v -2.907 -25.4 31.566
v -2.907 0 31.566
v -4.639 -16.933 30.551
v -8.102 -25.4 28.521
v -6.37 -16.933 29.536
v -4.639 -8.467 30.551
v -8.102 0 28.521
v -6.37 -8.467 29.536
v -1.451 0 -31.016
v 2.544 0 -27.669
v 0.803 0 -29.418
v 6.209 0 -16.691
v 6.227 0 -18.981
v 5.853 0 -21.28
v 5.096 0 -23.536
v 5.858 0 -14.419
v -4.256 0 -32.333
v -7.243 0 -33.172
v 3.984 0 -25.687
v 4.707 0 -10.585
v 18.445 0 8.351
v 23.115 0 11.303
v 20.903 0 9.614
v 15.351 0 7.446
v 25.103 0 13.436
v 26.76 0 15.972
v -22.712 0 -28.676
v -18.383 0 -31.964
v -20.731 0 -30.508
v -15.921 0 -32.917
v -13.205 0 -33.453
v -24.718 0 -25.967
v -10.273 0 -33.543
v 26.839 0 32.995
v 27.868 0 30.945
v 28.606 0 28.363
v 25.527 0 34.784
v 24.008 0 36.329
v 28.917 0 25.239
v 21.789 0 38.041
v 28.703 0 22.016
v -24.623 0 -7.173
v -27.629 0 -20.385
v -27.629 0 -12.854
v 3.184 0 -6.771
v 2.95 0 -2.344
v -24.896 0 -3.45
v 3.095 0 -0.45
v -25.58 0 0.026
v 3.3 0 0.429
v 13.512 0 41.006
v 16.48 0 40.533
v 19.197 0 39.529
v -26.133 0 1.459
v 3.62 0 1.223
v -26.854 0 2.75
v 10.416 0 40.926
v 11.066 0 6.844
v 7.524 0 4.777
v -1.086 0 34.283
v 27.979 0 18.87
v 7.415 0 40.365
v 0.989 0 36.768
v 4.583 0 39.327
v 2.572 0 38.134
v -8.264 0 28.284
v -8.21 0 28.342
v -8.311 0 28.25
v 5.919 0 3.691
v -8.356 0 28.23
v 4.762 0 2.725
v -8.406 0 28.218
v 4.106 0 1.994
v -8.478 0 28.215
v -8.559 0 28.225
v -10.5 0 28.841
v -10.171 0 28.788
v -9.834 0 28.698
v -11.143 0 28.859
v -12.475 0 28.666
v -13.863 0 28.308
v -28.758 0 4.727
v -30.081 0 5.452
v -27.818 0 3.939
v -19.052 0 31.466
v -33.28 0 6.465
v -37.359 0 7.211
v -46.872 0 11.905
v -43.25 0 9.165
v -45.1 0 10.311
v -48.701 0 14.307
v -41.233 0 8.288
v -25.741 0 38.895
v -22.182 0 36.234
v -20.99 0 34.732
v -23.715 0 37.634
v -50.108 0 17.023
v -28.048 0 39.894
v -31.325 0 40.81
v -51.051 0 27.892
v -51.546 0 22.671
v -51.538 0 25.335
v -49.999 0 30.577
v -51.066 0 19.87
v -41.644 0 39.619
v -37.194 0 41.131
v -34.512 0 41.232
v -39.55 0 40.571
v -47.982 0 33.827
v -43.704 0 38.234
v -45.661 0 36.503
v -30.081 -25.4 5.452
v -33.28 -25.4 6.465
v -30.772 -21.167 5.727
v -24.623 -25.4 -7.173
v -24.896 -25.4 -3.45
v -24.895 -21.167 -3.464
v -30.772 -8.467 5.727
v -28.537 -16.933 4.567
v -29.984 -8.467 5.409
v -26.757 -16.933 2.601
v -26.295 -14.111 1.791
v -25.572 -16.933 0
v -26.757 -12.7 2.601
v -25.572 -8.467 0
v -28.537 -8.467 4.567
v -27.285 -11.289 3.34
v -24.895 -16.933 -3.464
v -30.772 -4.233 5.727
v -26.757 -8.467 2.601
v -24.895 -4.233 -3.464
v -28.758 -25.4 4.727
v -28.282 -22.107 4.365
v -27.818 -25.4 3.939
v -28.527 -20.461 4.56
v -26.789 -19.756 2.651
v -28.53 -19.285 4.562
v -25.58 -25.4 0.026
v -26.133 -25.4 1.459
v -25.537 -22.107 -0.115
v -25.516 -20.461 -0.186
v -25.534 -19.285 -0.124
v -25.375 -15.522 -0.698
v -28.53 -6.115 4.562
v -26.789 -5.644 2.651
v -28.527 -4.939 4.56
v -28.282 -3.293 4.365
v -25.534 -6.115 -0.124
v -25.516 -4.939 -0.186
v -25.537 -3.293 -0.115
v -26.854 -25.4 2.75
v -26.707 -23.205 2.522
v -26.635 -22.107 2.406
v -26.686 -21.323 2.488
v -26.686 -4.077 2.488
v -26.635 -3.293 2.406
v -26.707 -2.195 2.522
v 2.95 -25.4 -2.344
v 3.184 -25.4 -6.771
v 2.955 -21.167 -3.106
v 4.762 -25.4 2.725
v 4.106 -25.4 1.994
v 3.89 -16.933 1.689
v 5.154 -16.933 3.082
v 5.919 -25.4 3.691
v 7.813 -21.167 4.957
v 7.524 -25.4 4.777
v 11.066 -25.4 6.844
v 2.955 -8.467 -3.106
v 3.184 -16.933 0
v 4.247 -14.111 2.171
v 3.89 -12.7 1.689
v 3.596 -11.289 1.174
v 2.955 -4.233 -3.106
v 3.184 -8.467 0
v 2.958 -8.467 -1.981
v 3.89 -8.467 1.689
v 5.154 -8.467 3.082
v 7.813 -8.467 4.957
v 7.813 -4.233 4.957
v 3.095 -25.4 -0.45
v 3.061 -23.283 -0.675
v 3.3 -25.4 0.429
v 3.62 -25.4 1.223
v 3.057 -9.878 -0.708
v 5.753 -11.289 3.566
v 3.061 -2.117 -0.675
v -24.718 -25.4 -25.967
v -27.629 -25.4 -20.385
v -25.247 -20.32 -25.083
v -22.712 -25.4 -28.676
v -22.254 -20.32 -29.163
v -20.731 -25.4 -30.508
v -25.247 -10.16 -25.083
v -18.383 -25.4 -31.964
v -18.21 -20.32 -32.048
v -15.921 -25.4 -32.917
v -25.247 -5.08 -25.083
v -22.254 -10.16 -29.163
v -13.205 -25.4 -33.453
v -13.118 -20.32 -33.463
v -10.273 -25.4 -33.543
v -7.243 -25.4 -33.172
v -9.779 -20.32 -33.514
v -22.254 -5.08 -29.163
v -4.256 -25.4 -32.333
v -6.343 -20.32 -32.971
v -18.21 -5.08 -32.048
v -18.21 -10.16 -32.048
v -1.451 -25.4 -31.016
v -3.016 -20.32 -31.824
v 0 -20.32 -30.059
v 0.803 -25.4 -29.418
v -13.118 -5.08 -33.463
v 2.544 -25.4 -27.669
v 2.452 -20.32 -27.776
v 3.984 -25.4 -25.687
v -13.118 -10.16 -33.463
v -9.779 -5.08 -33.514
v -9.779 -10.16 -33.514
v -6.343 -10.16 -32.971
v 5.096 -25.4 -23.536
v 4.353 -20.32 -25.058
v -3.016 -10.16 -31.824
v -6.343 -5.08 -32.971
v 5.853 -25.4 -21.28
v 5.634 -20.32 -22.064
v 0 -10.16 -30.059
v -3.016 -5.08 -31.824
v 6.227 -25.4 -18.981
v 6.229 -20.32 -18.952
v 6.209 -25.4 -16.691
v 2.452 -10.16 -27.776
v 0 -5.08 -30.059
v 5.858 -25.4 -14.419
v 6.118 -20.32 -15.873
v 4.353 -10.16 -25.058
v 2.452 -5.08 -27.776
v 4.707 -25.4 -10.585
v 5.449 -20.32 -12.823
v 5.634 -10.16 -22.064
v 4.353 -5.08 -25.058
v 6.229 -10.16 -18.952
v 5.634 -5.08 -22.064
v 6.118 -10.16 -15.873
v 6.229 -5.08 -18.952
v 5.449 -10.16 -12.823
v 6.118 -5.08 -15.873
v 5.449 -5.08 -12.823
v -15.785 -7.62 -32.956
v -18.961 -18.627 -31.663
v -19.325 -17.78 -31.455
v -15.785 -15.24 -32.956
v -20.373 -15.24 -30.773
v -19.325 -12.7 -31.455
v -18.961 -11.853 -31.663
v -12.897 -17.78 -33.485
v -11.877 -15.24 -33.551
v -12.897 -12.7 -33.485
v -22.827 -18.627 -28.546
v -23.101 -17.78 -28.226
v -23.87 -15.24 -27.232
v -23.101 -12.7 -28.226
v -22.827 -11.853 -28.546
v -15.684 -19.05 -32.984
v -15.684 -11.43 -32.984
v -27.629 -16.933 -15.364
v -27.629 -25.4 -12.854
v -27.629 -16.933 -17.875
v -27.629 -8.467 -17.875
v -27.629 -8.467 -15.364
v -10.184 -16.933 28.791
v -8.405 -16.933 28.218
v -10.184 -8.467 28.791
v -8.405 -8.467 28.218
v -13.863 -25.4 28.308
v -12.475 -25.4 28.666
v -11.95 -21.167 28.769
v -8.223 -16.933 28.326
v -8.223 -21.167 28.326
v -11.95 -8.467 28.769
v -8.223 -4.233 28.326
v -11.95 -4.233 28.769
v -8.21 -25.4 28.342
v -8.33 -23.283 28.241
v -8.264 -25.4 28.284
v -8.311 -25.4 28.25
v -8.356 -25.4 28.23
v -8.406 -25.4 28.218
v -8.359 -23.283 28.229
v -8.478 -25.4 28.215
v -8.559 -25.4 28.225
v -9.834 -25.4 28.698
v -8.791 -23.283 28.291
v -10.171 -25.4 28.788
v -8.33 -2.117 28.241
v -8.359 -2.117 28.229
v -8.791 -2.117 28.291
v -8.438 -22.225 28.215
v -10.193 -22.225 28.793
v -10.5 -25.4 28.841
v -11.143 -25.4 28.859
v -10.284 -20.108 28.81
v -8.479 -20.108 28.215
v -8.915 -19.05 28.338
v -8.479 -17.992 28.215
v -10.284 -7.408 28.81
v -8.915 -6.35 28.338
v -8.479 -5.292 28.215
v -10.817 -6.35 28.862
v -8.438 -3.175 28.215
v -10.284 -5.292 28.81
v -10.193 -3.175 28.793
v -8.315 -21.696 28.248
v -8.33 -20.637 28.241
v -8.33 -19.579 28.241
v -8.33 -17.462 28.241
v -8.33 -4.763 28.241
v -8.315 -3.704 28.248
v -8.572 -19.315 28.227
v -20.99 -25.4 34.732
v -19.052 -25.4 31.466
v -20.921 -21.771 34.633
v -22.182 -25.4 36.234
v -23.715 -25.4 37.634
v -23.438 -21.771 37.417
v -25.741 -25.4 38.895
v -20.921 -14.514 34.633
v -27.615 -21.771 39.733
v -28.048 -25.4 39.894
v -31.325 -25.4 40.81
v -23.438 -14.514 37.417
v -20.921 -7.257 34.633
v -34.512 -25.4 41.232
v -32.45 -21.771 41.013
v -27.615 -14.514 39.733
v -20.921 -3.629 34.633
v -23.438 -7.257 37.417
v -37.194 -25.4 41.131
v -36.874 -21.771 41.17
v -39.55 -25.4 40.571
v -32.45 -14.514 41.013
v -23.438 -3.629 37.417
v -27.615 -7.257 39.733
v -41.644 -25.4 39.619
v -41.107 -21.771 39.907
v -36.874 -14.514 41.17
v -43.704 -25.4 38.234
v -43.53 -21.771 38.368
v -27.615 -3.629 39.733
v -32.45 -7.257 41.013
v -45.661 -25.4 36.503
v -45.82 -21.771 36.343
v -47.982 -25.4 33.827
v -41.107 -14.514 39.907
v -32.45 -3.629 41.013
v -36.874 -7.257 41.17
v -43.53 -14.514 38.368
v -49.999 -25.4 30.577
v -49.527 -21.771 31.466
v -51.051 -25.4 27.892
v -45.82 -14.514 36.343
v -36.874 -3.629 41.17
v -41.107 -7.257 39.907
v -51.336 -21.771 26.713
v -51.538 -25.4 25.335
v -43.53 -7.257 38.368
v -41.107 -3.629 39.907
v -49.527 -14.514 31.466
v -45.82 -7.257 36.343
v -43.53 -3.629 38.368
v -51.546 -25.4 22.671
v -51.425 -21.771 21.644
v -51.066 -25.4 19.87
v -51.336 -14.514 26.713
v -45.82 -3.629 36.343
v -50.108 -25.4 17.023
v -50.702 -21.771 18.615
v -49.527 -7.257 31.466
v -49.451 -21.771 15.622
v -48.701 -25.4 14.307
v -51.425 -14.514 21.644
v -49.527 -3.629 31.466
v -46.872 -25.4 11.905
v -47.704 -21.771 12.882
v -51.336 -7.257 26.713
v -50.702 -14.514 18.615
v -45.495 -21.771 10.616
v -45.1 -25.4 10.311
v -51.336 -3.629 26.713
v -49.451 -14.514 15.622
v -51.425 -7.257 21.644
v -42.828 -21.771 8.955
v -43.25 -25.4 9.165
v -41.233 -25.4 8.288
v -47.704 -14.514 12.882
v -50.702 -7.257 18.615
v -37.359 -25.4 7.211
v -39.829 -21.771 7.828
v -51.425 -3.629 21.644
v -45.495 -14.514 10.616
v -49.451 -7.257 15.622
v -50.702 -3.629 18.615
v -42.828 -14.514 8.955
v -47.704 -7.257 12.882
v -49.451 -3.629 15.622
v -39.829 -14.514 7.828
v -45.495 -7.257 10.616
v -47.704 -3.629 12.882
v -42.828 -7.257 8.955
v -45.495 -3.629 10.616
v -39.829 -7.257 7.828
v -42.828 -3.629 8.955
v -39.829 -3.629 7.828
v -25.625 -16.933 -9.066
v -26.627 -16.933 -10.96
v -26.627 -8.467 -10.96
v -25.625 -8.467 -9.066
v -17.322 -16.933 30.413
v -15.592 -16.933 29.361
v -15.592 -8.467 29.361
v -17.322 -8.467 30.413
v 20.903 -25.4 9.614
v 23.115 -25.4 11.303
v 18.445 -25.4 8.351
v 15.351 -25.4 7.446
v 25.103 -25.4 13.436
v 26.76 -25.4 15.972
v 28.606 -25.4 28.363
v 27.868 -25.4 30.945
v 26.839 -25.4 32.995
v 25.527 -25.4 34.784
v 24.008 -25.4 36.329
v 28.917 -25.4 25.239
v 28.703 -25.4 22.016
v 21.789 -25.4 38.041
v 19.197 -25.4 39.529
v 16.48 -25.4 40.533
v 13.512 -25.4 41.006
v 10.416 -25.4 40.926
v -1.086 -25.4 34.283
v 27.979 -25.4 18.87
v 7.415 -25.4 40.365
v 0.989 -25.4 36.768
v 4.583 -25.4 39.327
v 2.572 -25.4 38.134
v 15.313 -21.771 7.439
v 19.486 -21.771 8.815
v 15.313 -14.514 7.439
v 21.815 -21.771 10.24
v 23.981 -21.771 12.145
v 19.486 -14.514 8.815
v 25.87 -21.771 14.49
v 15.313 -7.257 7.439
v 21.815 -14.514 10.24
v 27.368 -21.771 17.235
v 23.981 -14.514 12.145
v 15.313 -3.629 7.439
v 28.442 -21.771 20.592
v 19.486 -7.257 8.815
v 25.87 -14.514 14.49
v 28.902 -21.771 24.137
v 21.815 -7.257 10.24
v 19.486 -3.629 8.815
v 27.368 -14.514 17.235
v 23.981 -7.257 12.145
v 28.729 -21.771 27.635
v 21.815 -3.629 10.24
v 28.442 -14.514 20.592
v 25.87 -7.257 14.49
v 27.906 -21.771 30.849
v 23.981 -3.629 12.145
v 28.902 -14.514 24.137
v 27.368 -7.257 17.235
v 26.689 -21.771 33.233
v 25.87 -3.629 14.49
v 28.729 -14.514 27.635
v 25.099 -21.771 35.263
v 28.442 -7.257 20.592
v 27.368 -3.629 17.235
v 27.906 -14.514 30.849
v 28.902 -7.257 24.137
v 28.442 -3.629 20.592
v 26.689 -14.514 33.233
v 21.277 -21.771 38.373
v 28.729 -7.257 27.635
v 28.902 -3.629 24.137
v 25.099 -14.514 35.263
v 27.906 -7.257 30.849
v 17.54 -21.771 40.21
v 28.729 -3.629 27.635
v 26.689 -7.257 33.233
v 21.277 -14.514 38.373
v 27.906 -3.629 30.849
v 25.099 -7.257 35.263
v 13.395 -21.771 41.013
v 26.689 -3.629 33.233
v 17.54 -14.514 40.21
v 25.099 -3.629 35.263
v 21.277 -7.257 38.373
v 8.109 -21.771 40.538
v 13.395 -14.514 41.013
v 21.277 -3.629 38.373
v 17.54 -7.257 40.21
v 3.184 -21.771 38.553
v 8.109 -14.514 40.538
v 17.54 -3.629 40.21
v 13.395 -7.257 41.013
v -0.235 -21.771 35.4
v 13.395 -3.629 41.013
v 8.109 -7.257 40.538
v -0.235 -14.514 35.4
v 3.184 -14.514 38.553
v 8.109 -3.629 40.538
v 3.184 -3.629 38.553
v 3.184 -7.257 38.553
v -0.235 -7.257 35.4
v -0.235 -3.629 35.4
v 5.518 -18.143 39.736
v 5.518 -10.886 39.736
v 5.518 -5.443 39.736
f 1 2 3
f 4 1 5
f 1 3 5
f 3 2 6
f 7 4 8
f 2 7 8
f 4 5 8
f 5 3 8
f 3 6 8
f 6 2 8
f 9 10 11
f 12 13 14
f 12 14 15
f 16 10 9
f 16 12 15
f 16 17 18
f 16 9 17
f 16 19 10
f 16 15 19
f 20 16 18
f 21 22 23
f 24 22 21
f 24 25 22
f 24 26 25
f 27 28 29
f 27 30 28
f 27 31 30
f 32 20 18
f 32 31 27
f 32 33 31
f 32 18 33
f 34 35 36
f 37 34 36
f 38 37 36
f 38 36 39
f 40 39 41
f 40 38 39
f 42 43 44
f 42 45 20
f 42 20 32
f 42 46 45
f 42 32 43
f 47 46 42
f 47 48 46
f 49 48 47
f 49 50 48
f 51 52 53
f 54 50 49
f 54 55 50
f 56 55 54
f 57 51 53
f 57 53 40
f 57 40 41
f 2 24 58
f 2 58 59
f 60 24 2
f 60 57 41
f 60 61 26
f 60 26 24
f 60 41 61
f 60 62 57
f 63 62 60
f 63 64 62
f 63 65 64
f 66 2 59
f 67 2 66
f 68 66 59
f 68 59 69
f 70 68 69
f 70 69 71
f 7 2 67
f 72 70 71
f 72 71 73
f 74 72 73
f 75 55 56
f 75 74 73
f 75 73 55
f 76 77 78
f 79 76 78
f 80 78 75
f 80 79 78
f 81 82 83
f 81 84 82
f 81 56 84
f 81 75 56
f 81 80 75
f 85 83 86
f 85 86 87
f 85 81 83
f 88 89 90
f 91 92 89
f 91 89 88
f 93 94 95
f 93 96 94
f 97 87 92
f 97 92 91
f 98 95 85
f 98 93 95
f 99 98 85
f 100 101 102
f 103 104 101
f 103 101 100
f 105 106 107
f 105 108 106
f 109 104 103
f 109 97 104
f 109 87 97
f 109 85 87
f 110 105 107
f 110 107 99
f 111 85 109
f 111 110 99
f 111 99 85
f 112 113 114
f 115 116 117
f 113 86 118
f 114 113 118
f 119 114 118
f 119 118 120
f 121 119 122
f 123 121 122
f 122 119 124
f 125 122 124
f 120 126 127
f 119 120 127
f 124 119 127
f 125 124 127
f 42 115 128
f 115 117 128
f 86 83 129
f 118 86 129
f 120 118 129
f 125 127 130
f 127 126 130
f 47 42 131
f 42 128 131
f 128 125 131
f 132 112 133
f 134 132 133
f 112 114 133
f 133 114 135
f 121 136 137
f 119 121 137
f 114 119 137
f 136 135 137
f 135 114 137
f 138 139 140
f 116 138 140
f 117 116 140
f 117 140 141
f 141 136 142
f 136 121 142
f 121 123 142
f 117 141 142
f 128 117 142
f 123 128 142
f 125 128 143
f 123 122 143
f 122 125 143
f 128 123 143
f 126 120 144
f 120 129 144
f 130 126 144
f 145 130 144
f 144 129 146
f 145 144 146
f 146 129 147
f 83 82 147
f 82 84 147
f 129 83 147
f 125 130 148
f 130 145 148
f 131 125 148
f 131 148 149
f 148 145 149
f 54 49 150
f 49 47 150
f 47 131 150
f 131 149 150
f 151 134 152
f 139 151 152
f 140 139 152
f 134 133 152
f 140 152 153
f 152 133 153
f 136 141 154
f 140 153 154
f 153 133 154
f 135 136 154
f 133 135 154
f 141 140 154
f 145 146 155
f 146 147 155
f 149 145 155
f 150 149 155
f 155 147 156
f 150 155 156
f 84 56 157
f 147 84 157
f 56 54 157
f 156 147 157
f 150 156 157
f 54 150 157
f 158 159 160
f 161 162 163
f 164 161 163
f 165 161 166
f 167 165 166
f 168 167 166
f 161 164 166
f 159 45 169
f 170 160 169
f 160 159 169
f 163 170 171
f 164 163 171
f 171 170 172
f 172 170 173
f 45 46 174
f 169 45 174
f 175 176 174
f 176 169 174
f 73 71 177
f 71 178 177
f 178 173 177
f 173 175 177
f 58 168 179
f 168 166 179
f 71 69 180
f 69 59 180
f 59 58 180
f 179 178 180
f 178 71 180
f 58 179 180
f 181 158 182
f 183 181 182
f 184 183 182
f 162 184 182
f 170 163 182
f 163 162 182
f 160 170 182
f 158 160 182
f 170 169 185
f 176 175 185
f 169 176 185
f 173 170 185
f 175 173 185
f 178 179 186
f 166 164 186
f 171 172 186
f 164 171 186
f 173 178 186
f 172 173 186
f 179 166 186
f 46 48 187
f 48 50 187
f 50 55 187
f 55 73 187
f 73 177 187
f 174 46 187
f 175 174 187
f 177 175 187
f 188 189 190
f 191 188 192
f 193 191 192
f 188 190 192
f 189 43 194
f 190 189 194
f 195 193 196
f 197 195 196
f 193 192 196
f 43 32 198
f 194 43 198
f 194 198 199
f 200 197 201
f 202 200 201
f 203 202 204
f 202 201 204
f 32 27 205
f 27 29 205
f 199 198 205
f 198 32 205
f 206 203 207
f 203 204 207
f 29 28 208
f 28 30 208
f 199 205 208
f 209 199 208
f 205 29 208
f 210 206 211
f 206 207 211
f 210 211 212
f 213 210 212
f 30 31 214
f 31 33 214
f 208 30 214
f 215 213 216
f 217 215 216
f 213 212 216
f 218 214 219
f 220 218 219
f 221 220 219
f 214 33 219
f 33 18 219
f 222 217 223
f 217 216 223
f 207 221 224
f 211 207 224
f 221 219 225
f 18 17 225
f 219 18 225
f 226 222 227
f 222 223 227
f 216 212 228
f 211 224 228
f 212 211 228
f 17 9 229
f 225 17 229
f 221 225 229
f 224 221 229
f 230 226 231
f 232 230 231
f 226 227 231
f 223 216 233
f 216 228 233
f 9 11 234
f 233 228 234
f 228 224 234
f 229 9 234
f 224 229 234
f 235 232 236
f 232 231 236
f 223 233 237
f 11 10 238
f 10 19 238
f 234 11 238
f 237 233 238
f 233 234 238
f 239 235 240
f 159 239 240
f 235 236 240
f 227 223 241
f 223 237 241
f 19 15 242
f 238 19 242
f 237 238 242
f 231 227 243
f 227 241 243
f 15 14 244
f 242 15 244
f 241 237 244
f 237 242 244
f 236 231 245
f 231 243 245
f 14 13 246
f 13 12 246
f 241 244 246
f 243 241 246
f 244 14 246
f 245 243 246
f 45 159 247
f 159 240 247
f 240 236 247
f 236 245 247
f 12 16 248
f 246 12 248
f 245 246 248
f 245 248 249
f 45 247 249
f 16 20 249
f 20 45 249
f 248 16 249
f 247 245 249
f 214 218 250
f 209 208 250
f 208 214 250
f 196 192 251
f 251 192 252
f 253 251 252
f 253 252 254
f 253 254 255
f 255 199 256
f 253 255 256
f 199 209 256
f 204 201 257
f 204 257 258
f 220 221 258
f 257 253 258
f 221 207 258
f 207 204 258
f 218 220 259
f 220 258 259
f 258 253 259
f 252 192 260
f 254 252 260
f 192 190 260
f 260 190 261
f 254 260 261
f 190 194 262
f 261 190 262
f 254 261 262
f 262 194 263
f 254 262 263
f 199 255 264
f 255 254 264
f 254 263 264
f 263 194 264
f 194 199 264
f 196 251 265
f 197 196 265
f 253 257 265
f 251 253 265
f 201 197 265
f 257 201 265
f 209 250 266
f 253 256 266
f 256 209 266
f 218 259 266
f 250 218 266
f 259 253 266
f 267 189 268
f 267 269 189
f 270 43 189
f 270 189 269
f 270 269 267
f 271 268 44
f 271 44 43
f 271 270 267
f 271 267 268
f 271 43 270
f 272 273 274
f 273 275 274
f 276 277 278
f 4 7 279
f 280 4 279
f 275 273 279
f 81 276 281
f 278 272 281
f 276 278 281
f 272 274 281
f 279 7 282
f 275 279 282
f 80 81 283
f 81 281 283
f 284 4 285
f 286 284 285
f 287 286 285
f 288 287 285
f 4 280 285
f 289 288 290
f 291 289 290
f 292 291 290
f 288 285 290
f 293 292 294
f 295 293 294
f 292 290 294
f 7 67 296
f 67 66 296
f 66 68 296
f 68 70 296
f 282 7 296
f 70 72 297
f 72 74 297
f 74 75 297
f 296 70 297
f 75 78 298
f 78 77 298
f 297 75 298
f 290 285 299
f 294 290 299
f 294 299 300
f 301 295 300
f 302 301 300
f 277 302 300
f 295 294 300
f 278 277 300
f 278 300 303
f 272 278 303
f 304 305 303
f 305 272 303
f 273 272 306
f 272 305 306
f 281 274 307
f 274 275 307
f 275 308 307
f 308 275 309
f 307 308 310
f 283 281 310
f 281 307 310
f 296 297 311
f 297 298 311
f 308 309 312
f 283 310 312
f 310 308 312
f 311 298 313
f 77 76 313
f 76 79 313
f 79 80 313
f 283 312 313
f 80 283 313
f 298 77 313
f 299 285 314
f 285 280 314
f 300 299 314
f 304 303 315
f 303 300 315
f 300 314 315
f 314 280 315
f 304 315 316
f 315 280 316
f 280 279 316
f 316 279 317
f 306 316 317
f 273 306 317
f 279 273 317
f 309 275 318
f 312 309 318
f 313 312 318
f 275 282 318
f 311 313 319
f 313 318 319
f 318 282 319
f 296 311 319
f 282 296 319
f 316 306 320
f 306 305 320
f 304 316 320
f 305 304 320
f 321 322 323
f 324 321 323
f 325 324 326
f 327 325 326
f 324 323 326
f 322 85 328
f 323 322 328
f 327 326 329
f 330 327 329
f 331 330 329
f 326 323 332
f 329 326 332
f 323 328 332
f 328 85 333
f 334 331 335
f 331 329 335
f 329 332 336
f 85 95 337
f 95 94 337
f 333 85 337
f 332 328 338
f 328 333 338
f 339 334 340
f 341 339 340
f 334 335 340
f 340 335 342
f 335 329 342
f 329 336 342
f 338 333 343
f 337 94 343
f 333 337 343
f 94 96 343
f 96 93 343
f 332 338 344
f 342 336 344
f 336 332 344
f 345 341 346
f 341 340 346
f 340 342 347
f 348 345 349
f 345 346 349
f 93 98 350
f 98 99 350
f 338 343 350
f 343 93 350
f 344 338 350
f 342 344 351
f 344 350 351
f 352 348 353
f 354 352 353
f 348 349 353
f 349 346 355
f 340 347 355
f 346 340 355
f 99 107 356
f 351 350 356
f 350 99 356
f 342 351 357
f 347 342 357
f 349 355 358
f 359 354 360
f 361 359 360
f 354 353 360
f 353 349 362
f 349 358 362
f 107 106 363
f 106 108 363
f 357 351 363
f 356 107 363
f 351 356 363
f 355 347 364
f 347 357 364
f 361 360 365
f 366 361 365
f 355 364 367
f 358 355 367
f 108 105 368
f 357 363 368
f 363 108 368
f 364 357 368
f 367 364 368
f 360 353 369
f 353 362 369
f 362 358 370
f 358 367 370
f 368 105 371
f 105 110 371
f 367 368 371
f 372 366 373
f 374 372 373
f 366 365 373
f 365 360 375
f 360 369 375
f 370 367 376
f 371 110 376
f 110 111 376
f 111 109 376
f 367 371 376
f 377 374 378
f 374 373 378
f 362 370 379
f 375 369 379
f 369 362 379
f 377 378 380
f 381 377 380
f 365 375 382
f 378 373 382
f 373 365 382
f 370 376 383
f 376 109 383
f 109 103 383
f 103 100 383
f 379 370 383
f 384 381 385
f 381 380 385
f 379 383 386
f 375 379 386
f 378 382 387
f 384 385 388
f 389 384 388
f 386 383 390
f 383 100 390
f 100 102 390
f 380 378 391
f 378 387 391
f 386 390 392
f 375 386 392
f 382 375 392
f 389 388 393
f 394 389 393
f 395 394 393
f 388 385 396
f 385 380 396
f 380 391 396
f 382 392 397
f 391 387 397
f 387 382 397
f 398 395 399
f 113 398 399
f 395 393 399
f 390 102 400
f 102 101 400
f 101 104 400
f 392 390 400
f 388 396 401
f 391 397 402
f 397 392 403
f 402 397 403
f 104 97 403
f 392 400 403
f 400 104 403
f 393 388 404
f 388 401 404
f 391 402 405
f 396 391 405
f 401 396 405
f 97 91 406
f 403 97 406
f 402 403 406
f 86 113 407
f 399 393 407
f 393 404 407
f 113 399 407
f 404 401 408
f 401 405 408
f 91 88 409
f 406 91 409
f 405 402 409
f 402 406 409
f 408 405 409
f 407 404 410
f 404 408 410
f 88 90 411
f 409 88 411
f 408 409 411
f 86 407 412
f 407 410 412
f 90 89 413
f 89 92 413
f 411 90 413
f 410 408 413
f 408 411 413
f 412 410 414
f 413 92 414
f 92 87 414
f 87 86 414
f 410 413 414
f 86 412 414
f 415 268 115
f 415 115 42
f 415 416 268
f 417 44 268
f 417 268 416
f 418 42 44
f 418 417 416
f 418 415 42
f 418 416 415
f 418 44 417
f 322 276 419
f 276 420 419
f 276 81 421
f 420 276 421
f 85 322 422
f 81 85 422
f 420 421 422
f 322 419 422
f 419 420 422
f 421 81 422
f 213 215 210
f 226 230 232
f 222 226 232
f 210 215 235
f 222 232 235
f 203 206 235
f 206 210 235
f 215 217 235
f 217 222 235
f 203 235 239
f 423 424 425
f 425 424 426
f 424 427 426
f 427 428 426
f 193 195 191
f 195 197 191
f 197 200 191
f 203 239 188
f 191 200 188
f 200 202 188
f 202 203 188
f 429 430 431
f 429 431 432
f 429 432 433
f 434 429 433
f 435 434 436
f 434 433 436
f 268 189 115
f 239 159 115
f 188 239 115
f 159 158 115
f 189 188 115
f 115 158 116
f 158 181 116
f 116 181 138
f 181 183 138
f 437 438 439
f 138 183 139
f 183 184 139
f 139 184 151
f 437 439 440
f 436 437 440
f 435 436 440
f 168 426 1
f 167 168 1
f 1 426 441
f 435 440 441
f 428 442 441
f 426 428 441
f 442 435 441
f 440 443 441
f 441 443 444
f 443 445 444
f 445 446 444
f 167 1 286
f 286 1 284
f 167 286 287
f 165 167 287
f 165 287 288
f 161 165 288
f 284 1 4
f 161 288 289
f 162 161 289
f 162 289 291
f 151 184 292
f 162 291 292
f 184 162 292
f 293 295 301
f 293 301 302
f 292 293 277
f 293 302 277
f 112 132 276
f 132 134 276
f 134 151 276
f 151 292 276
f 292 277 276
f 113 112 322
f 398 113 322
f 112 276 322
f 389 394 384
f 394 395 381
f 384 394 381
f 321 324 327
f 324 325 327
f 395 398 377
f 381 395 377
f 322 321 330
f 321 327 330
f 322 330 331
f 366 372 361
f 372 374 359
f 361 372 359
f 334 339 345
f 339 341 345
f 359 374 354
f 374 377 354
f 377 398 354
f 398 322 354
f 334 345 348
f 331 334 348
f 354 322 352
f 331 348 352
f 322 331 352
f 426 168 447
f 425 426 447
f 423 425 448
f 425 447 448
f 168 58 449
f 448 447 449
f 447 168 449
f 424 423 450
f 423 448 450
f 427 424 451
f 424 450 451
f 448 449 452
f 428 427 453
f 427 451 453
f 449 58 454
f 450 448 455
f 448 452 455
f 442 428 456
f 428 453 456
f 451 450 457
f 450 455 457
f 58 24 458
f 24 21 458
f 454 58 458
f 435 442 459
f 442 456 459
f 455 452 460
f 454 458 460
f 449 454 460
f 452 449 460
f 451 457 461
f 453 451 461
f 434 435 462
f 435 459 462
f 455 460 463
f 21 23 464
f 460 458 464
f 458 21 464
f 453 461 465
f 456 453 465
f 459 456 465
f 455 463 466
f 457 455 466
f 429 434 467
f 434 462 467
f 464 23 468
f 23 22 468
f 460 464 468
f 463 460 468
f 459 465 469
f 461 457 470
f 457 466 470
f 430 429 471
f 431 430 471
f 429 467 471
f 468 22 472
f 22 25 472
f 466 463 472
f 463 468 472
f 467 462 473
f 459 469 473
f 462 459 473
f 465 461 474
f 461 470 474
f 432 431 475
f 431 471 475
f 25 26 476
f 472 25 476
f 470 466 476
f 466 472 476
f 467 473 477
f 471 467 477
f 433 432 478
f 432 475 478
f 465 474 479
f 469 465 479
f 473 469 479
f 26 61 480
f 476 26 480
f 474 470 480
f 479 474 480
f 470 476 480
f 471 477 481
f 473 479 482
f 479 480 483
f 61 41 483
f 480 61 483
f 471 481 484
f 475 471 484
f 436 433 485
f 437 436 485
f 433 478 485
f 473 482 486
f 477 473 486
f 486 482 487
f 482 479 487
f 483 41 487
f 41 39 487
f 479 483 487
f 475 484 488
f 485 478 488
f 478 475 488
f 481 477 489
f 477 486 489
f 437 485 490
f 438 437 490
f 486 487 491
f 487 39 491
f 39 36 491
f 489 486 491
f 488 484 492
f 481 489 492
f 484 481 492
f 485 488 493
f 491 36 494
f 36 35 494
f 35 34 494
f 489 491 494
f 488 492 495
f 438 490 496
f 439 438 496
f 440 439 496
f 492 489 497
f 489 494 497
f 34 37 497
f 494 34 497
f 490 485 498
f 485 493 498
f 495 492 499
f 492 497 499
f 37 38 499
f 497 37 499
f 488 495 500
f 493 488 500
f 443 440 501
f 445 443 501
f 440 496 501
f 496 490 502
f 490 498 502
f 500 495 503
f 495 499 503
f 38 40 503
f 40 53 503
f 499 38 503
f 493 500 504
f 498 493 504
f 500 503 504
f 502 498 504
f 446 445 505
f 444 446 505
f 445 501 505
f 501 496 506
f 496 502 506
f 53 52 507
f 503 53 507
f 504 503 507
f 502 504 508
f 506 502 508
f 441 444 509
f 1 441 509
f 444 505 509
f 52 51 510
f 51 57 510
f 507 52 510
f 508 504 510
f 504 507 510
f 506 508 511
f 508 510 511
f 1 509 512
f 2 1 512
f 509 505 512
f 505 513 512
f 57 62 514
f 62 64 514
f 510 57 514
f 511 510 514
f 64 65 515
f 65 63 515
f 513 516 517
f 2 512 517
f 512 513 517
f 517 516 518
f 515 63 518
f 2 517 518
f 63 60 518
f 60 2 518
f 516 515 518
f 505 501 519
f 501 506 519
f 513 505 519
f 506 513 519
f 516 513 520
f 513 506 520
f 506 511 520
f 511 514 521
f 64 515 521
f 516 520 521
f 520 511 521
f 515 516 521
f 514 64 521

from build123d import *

# Parameters (mm, degrees)
F1_DEPTH = 25.4


with BuildPart() as f1:
    # F0 (on Front) → F1 (new body)
    with BuildSketch(Plane.XZ):
        with BuildLine():
            add(Edge.make_bspline(
                [(-27.6286881417, -20.3854255378), (-27.6286881417, -17.8748021523), (-27.6286881417, -15.3641787668), (-27.6286881417, -12.8535553813)],
                knots=[0, 0, 0, 0, 7.5318701565, 7.5318701565, 7.5318701565, 7.5318701565], degree=3))
            add(Edge.make_bspline(
                [(-27.6286881417, -20.3854255378), (-26.1092043698, -23.5854090845), (-23.0847120299, -29.9548918678), (-13.2209182165, -34.8623586844), (1.2200823016, -31.7716672157), (8.2208434269, -18.8775586444), (4.8589181601, -10.7967678999), (3.183865454, -6.7705777474)],
                knots=[0, 0, 0, 0, 0.1867481255, 0.3717172144, 0.5860087813, 0.7937321457, 1, 1, 1, 1], degree=3))
            add(Edge.make_bspline(
                [(3.183865454, -6.7705777474), (2.980379295, -4.2650682035), (2.6273161112, 0.0821718286), (4.9825515642, 3.415960072), (8.8316287859, 5.5850452916), (11.0661461949, 6.8442714401)],
                knots=[0, 0, 0, 0, 0.3633196805, 0.6303858884, 1, 1, 1, 1], degree=3))
            add(Edge.make_bspline(
                [(11.0661461949, 6.8442714401), (13.9059741749, 7.1536443651), (20.0255031244, 7.8203102985), (28.9765689093, 16.5358193263), (29.6545930317, 31.4669019827), (21.5535617346, 38.8777793296), (13.5997745486, 41.9100492775), (2.2985353413, 39.6302648635), (-1.2083426226, 34.1974762045), (-2.9069874436, 31.5659679472)],
                knots=[0, 0, 0, 0, 0.1314945034, 0.2833567477, 0.4484177559, 0.5900162929, 0.7189401151, 0.8638615536, 1, 1, 1, 1], degree=3))
            add(Edge.make_bspline(
                [(-2.9069874436, 31.5659679472), (-4.6387010564, 30.5508263409), (-6.3704146693, 29.5356847346), (-8.1021282822, 28.5205431283)],
                knots=[0, 0, 0, 0, 6.0219681717, 6.0219681717, 6.0219681717, 6.0219681717], degree=3))
            add(Edge.make_bspline(
                [(-8.1021282822, 28.5205431283), (-8.1761618739, 28.3809412314), (-8.4048388965, 27.9497349996), (-10.3621891641, 29.2735854161), (-12.5708455735, 28.6646145593), (-13.8626433909, 28.3084399998)],
                knots=[0, 0, 0, 0, 0.1657863704, 0.5120855642, 1, 1, 1, 1], degree=3))
            add(Edge.make_bspline(
                [(-13.8626433909, 28.3084399998), (-15.5924912542, 29.3608518938), (-17.3223391175, 30.4132637878), (-19.0521869808, 31.4656756818)],
                knots=[0, 0, 0, 0, 6.0744958493, 6.0744958493, 6.0744958493, 6.0744958493], degree=3))
            add(Edge.make_bspline(
                [(-19.0521869808, 31.4656756818), (-20.2263646051, 33.6196190808), (-22.7458247198, 38.2413853035), (-32.5256777267, 41.6603853611), (-41.6076600705, 41.1351126394), (-50.5620557466, 31.7856991181), (-52.7026223099, 21.6594829992), (-46.6060756104, 8.7055327091), (-37.7443691815, 7.2154791487), (-33.2804918289, 6.4648995176)],
                knots=[0, 0, 0, 0, 0.1206556748, 0.258893675, 0.3899926295, 0.5432229975, 0.683576491, 0.840609058, 1, 1, 1, 1], degree=3))
            add(Edge.make_bspline(
                [(-33.2804918289, 6.4648995176), (-31.5781708039, 6.0201695547), (-28.1183865357, 5.1163037698), (-25.012792521, -0.0055690428), (-24.7592542473, -4.6733793168), (-24.6234927326, -7.1728401817)],
                knots=[0, 0, 0, 0, 0.3103245083, 0.630701164, 1, 1, 1, 1], degree=3))
            add(Edge.make_bspline(
                [(-27.6286881417, -12.8535553813), (-26.6269563387, -10.9599836481), (-25.6252245357, -9.0664119149), (-24.6234927326, -7.1728401817)],
                knots=[0, 0, 0, 0, 6.4266417844, 6.4266417844, 6.4266417844, 6.4266417844], degree=3))
        make_face()
    extrude(amount=F1_DEPTH)


solid = f1.part
